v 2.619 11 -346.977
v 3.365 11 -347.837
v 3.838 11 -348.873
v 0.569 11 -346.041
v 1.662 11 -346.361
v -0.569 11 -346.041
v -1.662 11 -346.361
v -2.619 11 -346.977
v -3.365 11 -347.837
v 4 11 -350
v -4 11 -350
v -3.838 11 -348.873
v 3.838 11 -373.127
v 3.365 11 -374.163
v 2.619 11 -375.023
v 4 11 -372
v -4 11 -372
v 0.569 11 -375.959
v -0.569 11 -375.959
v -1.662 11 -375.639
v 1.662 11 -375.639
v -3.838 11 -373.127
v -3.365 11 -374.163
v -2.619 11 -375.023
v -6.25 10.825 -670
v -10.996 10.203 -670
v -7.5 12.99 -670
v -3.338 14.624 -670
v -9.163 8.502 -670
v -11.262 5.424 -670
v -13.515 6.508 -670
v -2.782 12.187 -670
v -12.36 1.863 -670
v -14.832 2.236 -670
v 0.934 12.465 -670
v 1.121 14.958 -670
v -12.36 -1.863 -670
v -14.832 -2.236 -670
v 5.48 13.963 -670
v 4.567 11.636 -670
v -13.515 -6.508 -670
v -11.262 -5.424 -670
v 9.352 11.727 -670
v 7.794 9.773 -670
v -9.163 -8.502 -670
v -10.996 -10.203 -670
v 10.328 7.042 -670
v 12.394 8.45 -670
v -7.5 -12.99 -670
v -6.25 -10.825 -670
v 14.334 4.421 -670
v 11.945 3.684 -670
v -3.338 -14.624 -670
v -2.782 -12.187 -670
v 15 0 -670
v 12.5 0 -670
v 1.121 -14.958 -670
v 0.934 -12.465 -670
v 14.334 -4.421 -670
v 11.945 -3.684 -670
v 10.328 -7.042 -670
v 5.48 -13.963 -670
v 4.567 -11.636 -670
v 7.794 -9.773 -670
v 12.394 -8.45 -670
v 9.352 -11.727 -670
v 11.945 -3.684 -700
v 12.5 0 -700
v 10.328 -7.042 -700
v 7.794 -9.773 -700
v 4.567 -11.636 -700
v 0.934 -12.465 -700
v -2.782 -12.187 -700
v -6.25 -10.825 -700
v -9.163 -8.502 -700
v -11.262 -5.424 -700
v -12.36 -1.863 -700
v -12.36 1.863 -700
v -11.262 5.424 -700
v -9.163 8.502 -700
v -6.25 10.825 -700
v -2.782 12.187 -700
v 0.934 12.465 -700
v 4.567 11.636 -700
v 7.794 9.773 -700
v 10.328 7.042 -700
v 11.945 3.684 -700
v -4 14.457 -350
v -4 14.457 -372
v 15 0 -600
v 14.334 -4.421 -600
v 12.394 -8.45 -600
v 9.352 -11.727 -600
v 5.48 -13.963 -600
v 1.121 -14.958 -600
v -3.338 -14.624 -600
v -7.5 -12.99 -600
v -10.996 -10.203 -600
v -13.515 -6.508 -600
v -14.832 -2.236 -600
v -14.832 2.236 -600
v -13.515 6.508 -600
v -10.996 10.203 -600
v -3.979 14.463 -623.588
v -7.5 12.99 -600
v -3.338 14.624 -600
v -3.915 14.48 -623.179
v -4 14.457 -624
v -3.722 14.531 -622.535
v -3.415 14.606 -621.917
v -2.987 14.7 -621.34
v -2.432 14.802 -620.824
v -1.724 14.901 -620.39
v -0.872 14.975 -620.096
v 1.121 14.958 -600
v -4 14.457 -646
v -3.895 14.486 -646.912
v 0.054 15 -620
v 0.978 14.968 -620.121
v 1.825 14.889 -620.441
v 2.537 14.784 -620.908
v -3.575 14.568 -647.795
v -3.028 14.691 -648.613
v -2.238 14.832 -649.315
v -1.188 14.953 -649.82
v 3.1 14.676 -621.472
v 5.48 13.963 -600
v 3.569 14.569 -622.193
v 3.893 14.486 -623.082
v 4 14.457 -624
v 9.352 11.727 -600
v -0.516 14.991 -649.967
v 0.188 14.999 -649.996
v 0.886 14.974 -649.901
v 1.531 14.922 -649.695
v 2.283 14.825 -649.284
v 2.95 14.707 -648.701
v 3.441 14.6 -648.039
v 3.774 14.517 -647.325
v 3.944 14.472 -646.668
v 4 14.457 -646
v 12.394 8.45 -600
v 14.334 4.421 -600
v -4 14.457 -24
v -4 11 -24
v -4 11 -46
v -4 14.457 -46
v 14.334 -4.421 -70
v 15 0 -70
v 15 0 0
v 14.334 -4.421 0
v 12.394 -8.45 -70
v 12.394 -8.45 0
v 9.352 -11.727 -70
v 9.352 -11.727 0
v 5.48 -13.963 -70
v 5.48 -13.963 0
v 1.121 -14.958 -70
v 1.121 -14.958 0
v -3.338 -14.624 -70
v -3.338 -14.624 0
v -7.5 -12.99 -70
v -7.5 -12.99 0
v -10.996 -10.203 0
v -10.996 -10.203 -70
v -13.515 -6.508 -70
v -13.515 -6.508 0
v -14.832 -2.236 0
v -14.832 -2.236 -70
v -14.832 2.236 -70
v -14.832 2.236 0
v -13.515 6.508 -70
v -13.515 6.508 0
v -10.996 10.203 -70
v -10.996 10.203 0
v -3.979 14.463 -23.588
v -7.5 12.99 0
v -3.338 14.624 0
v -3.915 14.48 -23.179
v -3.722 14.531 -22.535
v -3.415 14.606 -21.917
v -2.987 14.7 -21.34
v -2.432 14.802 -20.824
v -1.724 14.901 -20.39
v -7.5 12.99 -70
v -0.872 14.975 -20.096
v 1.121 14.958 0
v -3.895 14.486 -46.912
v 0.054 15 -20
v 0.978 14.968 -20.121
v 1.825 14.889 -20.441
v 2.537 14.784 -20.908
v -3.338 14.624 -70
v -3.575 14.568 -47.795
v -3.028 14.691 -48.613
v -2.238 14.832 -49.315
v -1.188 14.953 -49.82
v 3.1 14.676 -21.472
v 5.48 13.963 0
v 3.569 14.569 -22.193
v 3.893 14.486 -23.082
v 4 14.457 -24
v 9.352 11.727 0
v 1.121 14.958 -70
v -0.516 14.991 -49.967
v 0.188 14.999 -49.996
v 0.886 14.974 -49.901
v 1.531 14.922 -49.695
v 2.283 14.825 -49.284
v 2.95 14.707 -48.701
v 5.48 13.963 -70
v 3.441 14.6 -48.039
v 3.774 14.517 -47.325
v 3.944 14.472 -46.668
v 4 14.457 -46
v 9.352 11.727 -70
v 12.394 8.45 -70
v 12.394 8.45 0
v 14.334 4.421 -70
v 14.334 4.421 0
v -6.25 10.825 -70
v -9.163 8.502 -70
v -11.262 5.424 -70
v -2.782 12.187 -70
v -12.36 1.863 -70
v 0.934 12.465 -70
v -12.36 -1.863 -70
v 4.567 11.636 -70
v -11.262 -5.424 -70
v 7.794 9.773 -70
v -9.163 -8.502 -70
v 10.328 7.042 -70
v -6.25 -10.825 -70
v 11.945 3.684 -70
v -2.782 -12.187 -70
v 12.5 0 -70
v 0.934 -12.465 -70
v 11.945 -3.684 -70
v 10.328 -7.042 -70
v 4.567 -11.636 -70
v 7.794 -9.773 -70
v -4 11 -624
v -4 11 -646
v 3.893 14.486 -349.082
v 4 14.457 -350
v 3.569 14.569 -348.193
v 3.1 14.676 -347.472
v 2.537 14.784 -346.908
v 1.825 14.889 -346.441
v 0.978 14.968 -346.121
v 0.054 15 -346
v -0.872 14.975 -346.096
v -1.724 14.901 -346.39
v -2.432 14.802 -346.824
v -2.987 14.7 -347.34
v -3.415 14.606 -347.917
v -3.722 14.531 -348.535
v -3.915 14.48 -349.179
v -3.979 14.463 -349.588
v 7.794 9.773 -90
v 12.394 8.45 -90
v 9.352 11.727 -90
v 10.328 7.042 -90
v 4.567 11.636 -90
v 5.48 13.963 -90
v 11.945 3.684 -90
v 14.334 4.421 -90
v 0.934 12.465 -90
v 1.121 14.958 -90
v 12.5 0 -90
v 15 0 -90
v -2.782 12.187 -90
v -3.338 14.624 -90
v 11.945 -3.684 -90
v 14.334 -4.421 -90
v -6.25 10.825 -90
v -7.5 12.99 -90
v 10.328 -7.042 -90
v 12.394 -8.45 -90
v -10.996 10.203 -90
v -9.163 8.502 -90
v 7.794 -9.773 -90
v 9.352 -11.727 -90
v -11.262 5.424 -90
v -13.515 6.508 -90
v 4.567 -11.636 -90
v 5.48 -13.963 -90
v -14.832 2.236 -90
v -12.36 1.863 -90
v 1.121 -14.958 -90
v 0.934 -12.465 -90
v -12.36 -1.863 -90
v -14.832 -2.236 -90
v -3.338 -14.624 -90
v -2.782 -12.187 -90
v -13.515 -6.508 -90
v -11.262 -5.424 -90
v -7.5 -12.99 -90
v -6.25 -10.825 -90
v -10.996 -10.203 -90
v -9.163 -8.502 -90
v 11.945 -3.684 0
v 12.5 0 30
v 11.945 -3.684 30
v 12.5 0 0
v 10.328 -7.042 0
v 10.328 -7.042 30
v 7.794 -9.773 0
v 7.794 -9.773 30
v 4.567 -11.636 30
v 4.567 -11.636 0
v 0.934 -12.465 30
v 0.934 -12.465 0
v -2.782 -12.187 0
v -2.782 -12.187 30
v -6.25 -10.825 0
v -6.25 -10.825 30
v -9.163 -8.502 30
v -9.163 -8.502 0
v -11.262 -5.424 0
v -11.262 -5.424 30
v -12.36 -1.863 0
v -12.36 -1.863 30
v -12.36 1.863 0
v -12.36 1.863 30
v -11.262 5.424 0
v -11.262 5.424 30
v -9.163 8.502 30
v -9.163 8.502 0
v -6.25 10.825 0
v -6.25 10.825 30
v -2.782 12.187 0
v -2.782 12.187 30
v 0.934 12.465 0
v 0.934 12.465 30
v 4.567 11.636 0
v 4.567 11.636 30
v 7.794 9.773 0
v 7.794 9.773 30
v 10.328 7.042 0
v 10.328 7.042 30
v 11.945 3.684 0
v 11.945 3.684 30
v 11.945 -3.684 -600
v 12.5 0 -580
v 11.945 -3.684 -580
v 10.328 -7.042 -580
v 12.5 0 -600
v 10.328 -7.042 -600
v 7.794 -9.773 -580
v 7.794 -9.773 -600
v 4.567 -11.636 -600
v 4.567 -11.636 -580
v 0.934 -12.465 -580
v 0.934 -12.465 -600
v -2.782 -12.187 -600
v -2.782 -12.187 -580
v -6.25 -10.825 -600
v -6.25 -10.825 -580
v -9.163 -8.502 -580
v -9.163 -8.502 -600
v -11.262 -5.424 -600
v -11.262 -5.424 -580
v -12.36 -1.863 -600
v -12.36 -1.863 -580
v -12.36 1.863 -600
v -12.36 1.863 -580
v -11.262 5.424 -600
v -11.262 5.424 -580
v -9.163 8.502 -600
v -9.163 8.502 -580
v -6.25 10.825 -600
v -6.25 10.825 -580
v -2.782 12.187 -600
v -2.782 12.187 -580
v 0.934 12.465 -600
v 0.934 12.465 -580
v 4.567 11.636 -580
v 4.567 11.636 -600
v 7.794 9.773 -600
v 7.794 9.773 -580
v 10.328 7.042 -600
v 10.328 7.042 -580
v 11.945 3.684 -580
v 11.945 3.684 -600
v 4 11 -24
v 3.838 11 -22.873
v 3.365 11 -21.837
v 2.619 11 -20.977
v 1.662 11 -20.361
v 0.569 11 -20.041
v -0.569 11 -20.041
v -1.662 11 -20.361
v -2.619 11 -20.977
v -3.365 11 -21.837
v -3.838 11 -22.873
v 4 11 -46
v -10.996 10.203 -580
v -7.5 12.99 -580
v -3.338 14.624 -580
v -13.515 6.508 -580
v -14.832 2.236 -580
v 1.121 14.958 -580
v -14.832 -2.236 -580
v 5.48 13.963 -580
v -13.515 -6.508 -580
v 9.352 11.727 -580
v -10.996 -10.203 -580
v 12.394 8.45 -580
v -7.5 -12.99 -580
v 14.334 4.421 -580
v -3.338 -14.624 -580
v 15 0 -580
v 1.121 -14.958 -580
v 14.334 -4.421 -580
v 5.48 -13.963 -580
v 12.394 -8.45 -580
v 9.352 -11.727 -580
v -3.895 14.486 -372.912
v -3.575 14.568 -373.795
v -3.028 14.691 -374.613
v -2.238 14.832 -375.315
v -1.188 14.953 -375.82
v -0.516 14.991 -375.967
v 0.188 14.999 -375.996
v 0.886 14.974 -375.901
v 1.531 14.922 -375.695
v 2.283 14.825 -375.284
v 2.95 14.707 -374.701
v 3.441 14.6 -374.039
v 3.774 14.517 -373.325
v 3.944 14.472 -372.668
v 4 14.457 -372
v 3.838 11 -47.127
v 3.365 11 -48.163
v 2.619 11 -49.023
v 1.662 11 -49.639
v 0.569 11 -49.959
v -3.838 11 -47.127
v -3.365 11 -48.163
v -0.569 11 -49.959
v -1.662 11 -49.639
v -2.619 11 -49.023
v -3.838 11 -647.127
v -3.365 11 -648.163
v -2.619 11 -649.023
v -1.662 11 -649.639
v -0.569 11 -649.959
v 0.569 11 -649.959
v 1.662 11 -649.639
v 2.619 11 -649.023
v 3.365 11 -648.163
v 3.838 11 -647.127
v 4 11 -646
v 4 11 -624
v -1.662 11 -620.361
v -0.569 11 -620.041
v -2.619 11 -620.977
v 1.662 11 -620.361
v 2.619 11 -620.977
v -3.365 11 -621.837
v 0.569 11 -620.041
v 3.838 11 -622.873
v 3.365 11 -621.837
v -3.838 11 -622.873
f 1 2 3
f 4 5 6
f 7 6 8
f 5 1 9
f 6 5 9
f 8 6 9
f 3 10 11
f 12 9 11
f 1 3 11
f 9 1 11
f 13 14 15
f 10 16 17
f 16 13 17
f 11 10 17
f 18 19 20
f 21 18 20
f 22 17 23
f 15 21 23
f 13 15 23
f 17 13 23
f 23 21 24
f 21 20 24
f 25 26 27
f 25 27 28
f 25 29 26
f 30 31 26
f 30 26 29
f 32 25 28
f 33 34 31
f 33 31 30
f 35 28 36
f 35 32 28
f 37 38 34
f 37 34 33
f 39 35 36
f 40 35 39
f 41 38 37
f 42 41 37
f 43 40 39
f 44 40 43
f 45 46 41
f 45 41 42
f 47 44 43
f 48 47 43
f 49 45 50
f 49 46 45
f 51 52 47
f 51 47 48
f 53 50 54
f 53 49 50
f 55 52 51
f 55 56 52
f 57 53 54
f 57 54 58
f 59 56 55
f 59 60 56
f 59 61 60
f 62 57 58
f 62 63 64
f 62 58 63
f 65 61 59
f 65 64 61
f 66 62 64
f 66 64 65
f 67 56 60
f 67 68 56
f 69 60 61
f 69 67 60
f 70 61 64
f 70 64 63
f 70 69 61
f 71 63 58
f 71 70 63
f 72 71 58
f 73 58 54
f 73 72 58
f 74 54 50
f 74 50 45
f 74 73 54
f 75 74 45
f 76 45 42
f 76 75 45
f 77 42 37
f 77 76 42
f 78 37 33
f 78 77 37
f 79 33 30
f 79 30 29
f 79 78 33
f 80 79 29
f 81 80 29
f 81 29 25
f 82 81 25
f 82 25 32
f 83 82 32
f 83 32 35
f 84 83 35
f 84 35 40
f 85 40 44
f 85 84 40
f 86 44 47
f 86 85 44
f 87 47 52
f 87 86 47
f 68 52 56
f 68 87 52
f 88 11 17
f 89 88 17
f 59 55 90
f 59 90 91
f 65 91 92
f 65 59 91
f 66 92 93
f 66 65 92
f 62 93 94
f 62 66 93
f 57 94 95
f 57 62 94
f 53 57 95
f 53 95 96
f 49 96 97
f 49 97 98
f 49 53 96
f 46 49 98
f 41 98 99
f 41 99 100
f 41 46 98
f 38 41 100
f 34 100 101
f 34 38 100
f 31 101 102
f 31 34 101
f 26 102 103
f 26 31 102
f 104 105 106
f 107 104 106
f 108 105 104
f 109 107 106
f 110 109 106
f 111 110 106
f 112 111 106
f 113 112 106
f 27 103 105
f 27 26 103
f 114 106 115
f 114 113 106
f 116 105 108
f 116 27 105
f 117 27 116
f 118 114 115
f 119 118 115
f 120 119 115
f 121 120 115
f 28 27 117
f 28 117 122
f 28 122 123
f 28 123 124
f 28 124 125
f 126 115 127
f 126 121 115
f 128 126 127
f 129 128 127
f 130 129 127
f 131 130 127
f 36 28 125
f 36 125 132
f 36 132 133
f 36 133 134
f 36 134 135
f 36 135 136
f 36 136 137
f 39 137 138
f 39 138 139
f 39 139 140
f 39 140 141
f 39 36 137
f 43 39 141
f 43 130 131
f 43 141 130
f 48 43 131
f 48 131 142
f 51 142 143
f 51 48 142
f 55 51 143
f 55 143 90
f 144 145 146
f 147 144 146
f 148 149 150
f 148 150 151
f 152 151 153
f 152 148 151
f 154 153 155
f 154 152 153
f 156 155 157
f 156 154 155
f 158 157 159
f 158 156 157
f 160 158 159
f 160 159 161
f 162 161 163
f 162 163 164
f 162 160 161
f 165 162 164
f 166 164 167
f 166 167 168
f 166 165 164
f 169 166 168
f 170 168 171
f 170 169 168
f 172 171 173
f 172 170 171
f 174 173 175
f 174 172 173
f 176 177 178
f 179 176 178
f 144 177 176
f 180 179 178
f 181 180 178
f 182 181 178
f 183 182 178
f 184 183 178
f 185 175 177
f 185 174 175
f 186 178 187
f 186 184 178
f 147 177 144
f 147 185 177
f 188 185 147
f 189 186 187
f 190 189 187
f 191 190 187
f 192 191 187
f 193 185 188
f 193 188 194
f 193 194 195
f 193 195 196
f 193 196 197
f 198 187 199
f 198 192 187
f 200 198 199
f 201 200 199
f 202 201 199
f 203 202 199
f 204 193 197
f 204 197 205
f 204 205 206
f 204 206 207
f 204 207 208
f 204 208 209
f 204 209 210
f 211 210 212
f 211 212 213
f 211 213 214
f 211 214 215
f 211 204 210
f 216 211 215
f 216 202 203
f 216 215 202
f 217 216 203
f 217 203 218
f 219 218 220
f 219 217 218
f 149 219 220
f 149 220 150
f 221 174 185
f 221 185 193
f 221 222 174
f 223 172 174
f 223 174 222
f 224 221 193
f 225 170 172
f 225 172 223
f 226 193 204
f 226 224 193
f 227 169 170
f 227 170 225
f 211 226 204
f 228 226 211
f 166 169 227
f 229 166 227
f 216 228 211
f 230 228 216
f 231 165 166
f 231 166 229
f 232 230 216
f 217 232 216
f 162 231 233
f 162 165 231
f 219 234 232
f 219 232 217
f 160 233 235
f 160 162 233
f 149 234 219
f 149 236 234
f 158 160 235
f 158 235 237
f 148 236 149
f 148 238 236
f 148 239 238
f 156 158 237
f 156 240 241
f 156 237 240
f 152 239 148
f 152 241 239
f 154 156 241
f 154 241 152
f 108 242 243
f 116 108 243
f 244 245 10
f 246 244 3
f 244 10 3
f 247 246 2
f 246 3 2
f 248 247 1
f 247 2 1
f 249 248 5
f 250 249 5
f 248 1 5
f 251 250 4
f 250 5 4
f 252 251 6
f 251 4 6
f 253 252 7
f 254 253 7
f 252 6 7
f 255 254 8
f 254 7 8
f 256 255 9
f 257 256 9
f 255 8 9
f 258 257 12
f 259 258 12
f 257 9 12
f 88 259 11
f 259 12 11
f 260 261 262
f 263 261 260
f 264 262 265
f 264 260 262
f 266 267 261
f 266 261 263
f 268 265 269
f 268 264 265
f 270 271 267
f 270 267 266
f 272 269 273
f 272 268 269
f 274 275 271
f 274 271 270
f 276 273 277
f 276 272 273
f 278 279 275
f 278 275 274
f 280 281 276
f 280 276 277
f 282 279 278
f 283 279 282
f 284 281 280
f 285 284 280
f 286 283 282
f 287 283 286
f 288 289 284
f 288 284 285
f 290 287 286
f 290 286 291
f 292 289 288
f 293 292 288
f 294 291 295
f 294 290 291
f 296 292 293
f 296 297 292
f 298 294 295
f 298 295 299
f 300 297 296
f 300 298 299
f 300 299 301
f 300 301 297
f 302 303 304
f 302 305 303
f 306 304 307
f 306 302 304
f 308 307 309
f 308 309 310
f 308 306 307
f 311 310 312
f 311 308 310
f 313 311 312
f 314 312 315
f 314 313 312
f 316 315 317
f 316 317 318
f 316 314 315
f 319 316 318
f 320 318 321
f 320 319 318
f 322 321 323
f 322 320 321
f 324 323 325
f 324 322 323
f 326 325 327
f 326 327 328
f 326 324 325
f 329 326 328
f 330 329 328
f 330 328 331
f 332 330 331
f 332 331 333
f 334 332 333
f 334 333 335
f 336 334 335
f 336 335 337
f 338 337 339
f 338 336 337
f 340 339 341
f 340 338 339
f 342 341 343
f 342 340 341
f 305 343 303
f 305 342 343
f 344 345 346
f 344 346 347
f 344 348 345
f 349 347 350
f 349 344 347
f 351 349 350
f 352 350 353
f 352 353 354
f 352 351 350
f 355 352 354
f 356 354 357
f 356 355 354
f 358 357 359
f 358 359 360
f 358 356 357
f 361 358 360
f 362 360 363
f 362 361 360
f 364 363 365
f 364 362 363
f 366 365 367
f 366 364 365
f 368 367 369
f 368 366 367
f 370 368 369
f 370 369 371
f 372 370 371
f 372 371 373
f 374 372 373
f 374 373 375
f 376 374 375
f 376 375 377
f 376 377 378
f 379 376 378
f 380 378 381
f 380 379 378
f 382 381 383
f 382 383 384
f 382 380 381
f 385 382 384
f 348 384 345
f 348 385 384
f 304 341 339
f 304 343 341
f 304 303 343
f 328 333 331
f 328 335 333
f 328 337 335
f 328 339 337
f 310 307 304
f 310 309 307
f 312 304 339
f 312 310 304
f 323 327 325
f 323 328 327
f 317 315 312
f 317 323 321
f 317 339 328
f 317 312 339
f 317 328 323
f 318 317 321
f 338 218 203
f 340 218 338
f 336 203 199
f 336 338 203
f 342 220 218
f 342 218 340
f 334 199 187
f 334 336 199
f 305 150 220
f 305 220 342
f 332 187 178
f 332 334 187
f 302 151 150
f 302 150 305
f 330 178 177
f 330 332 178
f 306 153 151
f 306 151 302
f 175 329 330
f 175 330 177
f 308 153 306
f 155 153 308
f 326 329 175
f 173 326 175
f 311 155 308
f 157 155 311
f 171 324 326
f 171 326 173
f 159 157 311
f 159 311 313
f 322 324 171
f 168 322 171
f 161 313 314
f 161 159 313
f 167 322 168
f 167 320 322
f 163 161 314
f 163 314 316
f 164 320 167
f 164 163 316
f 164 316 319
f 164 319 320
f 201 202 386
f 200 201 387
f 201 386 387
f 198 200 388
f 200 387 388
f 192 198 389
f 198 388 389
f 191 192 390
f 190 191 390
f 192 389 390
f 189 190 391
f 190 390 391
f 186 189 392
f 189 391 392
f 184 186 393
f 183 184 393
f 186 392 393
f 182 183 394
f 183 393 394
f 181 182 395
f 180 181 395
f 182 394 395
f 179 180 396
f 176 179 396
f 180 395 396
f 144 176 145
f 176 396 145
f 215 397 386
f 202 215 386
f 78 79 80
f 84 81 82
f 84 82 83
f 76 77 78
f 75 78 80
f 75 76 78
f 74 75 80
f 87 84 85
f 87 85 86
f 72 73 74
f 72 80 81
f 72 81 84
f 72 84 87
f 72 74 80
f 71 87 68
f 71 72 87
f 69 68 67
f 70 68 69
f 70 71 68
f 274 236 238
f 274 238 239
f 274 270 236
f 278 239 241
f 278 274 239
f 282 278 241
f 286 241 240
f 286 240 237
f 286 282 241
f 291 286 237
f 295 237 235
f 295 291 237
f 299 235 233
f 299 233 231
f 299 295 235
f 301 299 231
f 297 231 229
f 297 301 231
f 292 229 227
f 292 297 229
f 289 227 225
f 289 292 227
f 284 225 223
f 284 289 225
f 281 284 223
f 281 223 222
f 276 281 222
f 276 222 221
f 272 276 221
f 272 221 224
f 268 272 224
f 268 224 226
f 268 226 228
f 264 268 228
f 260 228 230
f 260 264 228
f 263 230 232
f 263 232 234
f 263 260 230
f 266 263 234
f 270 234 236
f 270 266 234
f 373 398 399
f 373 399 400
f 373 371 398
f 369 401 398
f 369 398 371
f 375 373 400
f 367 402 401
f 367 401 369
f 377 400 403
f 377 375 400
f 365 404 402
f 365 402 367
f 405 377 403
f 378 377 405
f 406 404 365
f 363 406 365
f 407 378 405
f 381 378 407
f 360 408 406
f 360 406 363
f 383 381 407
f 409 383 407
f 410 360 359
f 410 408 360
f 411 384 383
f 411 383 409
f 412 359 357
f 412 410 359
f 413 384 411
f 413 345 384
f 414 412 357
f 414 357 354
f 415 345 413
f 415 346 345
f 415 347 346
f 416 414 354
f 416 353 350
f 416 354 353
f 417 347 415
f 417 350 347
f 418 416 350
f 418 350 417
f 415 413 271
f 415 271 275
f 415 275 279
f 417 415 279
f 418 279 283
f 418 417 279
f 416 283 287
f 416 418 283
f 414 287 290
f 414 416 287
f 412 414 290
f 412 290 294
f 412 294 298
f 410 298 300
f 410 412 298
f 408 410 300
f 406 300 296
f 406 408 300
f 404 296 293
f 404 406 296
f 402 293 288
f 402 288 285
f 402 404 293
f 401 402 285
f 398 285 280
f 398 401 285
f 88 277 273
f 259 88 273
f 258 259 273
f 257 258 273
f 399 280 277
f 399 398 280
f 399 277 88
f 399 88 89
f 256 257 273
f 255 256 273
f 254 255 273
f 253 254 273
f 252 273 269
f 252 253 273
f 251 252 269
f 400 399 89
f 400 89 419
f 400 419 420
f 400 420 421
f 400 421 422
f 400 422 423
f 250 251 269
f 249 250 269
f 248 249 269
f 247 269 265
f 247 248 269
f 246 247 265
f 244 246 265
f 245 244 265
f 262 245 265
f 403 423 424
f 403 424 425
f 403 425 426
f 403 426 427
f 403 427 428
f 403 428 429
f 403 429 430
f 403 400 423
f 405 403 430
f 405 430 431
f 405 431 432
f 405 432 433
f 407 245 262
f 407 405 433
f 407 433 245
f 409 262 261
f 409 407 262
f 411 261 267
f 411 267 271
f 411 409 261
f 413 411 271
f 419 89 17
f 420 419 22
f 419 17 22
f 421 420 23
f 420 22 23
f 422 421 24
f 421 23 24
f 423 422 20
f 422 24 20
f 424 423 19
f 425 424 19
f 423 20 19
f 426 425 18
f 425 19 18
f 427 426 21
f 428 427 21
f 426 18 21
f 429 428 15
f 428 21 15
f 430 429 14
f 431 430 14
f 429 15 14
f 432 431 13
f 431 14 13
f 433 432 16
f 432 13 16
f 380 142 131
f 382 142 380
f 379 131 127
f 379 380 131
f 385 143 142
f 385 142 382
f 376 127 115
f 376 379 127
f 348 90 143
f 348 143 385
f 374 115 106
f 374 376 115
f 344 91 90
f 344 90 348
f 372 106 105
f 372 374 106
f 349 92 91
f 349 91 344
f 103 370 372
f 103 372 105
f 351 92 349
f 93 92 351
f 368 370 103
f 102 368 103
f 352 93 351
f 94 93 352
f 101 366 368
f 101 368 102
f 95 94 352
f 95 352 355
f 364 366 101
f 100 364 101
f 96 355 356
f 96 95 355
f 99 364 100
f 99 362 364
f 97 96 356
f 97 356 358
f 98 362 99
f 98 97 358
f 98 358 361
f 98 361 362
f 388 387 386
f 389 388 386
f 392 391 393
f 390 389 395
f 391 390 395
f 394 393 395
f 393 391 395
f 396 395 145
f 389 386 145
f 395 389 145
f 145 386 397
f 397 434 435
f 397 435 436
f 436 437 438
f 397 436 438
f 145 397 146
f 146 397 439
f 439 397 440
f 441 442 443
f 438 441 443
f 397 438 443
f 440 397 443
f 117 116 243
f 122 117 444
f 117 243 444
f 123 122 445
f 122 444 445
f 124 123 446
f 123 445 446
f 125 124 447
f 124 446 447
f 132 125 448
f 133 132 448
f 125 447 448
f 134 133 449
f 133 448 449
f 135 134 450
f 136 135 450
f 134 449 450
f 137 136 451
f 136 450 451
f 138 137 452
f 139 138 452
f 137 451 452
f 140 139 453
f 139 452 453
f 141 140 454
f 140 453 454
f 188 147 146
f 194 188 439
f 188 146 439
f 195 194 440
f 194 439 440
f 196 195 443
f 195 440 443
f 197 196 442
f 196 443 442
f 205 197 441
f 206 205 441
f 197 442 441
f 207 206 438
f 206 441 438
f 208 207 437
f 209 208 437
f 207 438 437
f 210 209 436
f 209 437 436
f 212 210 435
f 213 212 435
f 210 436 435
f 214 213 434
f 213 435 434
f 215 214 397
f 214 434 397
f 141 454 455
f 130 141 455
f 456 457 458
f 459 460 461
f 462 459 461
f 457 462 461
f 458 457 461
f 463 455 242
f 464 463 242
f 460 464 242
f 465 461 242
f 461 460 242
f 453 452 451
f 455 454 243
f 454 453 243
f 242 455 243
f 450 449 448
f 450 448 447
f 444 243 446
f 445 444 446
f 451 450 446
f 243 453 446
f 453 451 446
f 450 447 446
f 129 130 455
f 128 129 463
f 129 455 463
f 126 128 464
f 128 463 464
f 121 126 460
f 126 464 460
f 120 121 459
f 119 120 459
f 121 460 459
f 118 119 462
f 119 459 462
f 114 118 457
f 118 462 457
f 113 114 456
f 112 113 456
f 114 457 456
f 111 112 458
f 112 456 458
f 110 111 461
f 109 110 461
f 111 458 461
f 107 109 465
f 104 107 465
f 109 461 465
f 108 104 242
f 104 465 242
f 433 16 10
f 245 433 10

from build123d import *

# Parameters (mm, degrees)
CUT_EXTRUDE1_START = 11
CUT_EXTRUDE1_DEPTH = 690.321354808


with BuildPart() as part:
    # Sketch1 → Revolve1 (revolve)
    with BuildSketch(Plane(origin=(0, 0, 0), x_dir=(0, 0, -1), z_dir=(1, 0, 0)), mode=Mode.PRIVATE) as revolve1_sk:
        Polygon((0, 15), (70, 15), (70, 12.5), (90, 12.5), (90, 15), (580, 15), (580, 12.5), (600, 12.5), (600, 15), (670, 15), (670, 12.5), (700, 12.5), (700, 0), (-30, 0), (-30, 12.5), (0, 12.5), align=None)
    revolve(revolve1_sk.sketch.rotate(Axis((0, 0, 91.723358082), (0, 0, -1)), 90), axis=Axis((0, 0, 91.723358082), (0, 0, -1)))

    # Sketch2 → Cut-Extrude1 (cut, through all)
    with BuildSketch(Plane(origin=(0, 0, 0), x_dir=(1, 0, 0), z_dir=(0, 1, 0)).offset(CUT_EXTRUDE1_START)):
        with BuildLine():
            Line((4, 646), (4, 624))
            ThreePointArc((4, 624), (0, 620), (-4, 624))
            Line((-4, 624), (-4, 646))
            ThreePointArc((-4, 646), (0, 650), (4, 646))
        make_face()
        with BuildLine():
            Line((4, 372), (4, 350))
            ThreePointArc((4, 350), (0, 346), (-4, 350))
            Line((-4, 350), (-4, 372))
            ThreePointArc((-4, 372), (0, 376), (4, 372))
        make_face()
        with BuildLine():
            Line((4, 46), (4, 24))
            ThreePointArc((4, 24), (0, 20), (-4, 24))
            Line((-4, 24), (-4, 46))
            ThreePointArc((-4, 46), (0, 50), (4, 46))
        make_face()
    extrude(amount=CUT_EXTRUDE1_DEPTH, mode=Mode.SUBTRACT)


solid = part.part
